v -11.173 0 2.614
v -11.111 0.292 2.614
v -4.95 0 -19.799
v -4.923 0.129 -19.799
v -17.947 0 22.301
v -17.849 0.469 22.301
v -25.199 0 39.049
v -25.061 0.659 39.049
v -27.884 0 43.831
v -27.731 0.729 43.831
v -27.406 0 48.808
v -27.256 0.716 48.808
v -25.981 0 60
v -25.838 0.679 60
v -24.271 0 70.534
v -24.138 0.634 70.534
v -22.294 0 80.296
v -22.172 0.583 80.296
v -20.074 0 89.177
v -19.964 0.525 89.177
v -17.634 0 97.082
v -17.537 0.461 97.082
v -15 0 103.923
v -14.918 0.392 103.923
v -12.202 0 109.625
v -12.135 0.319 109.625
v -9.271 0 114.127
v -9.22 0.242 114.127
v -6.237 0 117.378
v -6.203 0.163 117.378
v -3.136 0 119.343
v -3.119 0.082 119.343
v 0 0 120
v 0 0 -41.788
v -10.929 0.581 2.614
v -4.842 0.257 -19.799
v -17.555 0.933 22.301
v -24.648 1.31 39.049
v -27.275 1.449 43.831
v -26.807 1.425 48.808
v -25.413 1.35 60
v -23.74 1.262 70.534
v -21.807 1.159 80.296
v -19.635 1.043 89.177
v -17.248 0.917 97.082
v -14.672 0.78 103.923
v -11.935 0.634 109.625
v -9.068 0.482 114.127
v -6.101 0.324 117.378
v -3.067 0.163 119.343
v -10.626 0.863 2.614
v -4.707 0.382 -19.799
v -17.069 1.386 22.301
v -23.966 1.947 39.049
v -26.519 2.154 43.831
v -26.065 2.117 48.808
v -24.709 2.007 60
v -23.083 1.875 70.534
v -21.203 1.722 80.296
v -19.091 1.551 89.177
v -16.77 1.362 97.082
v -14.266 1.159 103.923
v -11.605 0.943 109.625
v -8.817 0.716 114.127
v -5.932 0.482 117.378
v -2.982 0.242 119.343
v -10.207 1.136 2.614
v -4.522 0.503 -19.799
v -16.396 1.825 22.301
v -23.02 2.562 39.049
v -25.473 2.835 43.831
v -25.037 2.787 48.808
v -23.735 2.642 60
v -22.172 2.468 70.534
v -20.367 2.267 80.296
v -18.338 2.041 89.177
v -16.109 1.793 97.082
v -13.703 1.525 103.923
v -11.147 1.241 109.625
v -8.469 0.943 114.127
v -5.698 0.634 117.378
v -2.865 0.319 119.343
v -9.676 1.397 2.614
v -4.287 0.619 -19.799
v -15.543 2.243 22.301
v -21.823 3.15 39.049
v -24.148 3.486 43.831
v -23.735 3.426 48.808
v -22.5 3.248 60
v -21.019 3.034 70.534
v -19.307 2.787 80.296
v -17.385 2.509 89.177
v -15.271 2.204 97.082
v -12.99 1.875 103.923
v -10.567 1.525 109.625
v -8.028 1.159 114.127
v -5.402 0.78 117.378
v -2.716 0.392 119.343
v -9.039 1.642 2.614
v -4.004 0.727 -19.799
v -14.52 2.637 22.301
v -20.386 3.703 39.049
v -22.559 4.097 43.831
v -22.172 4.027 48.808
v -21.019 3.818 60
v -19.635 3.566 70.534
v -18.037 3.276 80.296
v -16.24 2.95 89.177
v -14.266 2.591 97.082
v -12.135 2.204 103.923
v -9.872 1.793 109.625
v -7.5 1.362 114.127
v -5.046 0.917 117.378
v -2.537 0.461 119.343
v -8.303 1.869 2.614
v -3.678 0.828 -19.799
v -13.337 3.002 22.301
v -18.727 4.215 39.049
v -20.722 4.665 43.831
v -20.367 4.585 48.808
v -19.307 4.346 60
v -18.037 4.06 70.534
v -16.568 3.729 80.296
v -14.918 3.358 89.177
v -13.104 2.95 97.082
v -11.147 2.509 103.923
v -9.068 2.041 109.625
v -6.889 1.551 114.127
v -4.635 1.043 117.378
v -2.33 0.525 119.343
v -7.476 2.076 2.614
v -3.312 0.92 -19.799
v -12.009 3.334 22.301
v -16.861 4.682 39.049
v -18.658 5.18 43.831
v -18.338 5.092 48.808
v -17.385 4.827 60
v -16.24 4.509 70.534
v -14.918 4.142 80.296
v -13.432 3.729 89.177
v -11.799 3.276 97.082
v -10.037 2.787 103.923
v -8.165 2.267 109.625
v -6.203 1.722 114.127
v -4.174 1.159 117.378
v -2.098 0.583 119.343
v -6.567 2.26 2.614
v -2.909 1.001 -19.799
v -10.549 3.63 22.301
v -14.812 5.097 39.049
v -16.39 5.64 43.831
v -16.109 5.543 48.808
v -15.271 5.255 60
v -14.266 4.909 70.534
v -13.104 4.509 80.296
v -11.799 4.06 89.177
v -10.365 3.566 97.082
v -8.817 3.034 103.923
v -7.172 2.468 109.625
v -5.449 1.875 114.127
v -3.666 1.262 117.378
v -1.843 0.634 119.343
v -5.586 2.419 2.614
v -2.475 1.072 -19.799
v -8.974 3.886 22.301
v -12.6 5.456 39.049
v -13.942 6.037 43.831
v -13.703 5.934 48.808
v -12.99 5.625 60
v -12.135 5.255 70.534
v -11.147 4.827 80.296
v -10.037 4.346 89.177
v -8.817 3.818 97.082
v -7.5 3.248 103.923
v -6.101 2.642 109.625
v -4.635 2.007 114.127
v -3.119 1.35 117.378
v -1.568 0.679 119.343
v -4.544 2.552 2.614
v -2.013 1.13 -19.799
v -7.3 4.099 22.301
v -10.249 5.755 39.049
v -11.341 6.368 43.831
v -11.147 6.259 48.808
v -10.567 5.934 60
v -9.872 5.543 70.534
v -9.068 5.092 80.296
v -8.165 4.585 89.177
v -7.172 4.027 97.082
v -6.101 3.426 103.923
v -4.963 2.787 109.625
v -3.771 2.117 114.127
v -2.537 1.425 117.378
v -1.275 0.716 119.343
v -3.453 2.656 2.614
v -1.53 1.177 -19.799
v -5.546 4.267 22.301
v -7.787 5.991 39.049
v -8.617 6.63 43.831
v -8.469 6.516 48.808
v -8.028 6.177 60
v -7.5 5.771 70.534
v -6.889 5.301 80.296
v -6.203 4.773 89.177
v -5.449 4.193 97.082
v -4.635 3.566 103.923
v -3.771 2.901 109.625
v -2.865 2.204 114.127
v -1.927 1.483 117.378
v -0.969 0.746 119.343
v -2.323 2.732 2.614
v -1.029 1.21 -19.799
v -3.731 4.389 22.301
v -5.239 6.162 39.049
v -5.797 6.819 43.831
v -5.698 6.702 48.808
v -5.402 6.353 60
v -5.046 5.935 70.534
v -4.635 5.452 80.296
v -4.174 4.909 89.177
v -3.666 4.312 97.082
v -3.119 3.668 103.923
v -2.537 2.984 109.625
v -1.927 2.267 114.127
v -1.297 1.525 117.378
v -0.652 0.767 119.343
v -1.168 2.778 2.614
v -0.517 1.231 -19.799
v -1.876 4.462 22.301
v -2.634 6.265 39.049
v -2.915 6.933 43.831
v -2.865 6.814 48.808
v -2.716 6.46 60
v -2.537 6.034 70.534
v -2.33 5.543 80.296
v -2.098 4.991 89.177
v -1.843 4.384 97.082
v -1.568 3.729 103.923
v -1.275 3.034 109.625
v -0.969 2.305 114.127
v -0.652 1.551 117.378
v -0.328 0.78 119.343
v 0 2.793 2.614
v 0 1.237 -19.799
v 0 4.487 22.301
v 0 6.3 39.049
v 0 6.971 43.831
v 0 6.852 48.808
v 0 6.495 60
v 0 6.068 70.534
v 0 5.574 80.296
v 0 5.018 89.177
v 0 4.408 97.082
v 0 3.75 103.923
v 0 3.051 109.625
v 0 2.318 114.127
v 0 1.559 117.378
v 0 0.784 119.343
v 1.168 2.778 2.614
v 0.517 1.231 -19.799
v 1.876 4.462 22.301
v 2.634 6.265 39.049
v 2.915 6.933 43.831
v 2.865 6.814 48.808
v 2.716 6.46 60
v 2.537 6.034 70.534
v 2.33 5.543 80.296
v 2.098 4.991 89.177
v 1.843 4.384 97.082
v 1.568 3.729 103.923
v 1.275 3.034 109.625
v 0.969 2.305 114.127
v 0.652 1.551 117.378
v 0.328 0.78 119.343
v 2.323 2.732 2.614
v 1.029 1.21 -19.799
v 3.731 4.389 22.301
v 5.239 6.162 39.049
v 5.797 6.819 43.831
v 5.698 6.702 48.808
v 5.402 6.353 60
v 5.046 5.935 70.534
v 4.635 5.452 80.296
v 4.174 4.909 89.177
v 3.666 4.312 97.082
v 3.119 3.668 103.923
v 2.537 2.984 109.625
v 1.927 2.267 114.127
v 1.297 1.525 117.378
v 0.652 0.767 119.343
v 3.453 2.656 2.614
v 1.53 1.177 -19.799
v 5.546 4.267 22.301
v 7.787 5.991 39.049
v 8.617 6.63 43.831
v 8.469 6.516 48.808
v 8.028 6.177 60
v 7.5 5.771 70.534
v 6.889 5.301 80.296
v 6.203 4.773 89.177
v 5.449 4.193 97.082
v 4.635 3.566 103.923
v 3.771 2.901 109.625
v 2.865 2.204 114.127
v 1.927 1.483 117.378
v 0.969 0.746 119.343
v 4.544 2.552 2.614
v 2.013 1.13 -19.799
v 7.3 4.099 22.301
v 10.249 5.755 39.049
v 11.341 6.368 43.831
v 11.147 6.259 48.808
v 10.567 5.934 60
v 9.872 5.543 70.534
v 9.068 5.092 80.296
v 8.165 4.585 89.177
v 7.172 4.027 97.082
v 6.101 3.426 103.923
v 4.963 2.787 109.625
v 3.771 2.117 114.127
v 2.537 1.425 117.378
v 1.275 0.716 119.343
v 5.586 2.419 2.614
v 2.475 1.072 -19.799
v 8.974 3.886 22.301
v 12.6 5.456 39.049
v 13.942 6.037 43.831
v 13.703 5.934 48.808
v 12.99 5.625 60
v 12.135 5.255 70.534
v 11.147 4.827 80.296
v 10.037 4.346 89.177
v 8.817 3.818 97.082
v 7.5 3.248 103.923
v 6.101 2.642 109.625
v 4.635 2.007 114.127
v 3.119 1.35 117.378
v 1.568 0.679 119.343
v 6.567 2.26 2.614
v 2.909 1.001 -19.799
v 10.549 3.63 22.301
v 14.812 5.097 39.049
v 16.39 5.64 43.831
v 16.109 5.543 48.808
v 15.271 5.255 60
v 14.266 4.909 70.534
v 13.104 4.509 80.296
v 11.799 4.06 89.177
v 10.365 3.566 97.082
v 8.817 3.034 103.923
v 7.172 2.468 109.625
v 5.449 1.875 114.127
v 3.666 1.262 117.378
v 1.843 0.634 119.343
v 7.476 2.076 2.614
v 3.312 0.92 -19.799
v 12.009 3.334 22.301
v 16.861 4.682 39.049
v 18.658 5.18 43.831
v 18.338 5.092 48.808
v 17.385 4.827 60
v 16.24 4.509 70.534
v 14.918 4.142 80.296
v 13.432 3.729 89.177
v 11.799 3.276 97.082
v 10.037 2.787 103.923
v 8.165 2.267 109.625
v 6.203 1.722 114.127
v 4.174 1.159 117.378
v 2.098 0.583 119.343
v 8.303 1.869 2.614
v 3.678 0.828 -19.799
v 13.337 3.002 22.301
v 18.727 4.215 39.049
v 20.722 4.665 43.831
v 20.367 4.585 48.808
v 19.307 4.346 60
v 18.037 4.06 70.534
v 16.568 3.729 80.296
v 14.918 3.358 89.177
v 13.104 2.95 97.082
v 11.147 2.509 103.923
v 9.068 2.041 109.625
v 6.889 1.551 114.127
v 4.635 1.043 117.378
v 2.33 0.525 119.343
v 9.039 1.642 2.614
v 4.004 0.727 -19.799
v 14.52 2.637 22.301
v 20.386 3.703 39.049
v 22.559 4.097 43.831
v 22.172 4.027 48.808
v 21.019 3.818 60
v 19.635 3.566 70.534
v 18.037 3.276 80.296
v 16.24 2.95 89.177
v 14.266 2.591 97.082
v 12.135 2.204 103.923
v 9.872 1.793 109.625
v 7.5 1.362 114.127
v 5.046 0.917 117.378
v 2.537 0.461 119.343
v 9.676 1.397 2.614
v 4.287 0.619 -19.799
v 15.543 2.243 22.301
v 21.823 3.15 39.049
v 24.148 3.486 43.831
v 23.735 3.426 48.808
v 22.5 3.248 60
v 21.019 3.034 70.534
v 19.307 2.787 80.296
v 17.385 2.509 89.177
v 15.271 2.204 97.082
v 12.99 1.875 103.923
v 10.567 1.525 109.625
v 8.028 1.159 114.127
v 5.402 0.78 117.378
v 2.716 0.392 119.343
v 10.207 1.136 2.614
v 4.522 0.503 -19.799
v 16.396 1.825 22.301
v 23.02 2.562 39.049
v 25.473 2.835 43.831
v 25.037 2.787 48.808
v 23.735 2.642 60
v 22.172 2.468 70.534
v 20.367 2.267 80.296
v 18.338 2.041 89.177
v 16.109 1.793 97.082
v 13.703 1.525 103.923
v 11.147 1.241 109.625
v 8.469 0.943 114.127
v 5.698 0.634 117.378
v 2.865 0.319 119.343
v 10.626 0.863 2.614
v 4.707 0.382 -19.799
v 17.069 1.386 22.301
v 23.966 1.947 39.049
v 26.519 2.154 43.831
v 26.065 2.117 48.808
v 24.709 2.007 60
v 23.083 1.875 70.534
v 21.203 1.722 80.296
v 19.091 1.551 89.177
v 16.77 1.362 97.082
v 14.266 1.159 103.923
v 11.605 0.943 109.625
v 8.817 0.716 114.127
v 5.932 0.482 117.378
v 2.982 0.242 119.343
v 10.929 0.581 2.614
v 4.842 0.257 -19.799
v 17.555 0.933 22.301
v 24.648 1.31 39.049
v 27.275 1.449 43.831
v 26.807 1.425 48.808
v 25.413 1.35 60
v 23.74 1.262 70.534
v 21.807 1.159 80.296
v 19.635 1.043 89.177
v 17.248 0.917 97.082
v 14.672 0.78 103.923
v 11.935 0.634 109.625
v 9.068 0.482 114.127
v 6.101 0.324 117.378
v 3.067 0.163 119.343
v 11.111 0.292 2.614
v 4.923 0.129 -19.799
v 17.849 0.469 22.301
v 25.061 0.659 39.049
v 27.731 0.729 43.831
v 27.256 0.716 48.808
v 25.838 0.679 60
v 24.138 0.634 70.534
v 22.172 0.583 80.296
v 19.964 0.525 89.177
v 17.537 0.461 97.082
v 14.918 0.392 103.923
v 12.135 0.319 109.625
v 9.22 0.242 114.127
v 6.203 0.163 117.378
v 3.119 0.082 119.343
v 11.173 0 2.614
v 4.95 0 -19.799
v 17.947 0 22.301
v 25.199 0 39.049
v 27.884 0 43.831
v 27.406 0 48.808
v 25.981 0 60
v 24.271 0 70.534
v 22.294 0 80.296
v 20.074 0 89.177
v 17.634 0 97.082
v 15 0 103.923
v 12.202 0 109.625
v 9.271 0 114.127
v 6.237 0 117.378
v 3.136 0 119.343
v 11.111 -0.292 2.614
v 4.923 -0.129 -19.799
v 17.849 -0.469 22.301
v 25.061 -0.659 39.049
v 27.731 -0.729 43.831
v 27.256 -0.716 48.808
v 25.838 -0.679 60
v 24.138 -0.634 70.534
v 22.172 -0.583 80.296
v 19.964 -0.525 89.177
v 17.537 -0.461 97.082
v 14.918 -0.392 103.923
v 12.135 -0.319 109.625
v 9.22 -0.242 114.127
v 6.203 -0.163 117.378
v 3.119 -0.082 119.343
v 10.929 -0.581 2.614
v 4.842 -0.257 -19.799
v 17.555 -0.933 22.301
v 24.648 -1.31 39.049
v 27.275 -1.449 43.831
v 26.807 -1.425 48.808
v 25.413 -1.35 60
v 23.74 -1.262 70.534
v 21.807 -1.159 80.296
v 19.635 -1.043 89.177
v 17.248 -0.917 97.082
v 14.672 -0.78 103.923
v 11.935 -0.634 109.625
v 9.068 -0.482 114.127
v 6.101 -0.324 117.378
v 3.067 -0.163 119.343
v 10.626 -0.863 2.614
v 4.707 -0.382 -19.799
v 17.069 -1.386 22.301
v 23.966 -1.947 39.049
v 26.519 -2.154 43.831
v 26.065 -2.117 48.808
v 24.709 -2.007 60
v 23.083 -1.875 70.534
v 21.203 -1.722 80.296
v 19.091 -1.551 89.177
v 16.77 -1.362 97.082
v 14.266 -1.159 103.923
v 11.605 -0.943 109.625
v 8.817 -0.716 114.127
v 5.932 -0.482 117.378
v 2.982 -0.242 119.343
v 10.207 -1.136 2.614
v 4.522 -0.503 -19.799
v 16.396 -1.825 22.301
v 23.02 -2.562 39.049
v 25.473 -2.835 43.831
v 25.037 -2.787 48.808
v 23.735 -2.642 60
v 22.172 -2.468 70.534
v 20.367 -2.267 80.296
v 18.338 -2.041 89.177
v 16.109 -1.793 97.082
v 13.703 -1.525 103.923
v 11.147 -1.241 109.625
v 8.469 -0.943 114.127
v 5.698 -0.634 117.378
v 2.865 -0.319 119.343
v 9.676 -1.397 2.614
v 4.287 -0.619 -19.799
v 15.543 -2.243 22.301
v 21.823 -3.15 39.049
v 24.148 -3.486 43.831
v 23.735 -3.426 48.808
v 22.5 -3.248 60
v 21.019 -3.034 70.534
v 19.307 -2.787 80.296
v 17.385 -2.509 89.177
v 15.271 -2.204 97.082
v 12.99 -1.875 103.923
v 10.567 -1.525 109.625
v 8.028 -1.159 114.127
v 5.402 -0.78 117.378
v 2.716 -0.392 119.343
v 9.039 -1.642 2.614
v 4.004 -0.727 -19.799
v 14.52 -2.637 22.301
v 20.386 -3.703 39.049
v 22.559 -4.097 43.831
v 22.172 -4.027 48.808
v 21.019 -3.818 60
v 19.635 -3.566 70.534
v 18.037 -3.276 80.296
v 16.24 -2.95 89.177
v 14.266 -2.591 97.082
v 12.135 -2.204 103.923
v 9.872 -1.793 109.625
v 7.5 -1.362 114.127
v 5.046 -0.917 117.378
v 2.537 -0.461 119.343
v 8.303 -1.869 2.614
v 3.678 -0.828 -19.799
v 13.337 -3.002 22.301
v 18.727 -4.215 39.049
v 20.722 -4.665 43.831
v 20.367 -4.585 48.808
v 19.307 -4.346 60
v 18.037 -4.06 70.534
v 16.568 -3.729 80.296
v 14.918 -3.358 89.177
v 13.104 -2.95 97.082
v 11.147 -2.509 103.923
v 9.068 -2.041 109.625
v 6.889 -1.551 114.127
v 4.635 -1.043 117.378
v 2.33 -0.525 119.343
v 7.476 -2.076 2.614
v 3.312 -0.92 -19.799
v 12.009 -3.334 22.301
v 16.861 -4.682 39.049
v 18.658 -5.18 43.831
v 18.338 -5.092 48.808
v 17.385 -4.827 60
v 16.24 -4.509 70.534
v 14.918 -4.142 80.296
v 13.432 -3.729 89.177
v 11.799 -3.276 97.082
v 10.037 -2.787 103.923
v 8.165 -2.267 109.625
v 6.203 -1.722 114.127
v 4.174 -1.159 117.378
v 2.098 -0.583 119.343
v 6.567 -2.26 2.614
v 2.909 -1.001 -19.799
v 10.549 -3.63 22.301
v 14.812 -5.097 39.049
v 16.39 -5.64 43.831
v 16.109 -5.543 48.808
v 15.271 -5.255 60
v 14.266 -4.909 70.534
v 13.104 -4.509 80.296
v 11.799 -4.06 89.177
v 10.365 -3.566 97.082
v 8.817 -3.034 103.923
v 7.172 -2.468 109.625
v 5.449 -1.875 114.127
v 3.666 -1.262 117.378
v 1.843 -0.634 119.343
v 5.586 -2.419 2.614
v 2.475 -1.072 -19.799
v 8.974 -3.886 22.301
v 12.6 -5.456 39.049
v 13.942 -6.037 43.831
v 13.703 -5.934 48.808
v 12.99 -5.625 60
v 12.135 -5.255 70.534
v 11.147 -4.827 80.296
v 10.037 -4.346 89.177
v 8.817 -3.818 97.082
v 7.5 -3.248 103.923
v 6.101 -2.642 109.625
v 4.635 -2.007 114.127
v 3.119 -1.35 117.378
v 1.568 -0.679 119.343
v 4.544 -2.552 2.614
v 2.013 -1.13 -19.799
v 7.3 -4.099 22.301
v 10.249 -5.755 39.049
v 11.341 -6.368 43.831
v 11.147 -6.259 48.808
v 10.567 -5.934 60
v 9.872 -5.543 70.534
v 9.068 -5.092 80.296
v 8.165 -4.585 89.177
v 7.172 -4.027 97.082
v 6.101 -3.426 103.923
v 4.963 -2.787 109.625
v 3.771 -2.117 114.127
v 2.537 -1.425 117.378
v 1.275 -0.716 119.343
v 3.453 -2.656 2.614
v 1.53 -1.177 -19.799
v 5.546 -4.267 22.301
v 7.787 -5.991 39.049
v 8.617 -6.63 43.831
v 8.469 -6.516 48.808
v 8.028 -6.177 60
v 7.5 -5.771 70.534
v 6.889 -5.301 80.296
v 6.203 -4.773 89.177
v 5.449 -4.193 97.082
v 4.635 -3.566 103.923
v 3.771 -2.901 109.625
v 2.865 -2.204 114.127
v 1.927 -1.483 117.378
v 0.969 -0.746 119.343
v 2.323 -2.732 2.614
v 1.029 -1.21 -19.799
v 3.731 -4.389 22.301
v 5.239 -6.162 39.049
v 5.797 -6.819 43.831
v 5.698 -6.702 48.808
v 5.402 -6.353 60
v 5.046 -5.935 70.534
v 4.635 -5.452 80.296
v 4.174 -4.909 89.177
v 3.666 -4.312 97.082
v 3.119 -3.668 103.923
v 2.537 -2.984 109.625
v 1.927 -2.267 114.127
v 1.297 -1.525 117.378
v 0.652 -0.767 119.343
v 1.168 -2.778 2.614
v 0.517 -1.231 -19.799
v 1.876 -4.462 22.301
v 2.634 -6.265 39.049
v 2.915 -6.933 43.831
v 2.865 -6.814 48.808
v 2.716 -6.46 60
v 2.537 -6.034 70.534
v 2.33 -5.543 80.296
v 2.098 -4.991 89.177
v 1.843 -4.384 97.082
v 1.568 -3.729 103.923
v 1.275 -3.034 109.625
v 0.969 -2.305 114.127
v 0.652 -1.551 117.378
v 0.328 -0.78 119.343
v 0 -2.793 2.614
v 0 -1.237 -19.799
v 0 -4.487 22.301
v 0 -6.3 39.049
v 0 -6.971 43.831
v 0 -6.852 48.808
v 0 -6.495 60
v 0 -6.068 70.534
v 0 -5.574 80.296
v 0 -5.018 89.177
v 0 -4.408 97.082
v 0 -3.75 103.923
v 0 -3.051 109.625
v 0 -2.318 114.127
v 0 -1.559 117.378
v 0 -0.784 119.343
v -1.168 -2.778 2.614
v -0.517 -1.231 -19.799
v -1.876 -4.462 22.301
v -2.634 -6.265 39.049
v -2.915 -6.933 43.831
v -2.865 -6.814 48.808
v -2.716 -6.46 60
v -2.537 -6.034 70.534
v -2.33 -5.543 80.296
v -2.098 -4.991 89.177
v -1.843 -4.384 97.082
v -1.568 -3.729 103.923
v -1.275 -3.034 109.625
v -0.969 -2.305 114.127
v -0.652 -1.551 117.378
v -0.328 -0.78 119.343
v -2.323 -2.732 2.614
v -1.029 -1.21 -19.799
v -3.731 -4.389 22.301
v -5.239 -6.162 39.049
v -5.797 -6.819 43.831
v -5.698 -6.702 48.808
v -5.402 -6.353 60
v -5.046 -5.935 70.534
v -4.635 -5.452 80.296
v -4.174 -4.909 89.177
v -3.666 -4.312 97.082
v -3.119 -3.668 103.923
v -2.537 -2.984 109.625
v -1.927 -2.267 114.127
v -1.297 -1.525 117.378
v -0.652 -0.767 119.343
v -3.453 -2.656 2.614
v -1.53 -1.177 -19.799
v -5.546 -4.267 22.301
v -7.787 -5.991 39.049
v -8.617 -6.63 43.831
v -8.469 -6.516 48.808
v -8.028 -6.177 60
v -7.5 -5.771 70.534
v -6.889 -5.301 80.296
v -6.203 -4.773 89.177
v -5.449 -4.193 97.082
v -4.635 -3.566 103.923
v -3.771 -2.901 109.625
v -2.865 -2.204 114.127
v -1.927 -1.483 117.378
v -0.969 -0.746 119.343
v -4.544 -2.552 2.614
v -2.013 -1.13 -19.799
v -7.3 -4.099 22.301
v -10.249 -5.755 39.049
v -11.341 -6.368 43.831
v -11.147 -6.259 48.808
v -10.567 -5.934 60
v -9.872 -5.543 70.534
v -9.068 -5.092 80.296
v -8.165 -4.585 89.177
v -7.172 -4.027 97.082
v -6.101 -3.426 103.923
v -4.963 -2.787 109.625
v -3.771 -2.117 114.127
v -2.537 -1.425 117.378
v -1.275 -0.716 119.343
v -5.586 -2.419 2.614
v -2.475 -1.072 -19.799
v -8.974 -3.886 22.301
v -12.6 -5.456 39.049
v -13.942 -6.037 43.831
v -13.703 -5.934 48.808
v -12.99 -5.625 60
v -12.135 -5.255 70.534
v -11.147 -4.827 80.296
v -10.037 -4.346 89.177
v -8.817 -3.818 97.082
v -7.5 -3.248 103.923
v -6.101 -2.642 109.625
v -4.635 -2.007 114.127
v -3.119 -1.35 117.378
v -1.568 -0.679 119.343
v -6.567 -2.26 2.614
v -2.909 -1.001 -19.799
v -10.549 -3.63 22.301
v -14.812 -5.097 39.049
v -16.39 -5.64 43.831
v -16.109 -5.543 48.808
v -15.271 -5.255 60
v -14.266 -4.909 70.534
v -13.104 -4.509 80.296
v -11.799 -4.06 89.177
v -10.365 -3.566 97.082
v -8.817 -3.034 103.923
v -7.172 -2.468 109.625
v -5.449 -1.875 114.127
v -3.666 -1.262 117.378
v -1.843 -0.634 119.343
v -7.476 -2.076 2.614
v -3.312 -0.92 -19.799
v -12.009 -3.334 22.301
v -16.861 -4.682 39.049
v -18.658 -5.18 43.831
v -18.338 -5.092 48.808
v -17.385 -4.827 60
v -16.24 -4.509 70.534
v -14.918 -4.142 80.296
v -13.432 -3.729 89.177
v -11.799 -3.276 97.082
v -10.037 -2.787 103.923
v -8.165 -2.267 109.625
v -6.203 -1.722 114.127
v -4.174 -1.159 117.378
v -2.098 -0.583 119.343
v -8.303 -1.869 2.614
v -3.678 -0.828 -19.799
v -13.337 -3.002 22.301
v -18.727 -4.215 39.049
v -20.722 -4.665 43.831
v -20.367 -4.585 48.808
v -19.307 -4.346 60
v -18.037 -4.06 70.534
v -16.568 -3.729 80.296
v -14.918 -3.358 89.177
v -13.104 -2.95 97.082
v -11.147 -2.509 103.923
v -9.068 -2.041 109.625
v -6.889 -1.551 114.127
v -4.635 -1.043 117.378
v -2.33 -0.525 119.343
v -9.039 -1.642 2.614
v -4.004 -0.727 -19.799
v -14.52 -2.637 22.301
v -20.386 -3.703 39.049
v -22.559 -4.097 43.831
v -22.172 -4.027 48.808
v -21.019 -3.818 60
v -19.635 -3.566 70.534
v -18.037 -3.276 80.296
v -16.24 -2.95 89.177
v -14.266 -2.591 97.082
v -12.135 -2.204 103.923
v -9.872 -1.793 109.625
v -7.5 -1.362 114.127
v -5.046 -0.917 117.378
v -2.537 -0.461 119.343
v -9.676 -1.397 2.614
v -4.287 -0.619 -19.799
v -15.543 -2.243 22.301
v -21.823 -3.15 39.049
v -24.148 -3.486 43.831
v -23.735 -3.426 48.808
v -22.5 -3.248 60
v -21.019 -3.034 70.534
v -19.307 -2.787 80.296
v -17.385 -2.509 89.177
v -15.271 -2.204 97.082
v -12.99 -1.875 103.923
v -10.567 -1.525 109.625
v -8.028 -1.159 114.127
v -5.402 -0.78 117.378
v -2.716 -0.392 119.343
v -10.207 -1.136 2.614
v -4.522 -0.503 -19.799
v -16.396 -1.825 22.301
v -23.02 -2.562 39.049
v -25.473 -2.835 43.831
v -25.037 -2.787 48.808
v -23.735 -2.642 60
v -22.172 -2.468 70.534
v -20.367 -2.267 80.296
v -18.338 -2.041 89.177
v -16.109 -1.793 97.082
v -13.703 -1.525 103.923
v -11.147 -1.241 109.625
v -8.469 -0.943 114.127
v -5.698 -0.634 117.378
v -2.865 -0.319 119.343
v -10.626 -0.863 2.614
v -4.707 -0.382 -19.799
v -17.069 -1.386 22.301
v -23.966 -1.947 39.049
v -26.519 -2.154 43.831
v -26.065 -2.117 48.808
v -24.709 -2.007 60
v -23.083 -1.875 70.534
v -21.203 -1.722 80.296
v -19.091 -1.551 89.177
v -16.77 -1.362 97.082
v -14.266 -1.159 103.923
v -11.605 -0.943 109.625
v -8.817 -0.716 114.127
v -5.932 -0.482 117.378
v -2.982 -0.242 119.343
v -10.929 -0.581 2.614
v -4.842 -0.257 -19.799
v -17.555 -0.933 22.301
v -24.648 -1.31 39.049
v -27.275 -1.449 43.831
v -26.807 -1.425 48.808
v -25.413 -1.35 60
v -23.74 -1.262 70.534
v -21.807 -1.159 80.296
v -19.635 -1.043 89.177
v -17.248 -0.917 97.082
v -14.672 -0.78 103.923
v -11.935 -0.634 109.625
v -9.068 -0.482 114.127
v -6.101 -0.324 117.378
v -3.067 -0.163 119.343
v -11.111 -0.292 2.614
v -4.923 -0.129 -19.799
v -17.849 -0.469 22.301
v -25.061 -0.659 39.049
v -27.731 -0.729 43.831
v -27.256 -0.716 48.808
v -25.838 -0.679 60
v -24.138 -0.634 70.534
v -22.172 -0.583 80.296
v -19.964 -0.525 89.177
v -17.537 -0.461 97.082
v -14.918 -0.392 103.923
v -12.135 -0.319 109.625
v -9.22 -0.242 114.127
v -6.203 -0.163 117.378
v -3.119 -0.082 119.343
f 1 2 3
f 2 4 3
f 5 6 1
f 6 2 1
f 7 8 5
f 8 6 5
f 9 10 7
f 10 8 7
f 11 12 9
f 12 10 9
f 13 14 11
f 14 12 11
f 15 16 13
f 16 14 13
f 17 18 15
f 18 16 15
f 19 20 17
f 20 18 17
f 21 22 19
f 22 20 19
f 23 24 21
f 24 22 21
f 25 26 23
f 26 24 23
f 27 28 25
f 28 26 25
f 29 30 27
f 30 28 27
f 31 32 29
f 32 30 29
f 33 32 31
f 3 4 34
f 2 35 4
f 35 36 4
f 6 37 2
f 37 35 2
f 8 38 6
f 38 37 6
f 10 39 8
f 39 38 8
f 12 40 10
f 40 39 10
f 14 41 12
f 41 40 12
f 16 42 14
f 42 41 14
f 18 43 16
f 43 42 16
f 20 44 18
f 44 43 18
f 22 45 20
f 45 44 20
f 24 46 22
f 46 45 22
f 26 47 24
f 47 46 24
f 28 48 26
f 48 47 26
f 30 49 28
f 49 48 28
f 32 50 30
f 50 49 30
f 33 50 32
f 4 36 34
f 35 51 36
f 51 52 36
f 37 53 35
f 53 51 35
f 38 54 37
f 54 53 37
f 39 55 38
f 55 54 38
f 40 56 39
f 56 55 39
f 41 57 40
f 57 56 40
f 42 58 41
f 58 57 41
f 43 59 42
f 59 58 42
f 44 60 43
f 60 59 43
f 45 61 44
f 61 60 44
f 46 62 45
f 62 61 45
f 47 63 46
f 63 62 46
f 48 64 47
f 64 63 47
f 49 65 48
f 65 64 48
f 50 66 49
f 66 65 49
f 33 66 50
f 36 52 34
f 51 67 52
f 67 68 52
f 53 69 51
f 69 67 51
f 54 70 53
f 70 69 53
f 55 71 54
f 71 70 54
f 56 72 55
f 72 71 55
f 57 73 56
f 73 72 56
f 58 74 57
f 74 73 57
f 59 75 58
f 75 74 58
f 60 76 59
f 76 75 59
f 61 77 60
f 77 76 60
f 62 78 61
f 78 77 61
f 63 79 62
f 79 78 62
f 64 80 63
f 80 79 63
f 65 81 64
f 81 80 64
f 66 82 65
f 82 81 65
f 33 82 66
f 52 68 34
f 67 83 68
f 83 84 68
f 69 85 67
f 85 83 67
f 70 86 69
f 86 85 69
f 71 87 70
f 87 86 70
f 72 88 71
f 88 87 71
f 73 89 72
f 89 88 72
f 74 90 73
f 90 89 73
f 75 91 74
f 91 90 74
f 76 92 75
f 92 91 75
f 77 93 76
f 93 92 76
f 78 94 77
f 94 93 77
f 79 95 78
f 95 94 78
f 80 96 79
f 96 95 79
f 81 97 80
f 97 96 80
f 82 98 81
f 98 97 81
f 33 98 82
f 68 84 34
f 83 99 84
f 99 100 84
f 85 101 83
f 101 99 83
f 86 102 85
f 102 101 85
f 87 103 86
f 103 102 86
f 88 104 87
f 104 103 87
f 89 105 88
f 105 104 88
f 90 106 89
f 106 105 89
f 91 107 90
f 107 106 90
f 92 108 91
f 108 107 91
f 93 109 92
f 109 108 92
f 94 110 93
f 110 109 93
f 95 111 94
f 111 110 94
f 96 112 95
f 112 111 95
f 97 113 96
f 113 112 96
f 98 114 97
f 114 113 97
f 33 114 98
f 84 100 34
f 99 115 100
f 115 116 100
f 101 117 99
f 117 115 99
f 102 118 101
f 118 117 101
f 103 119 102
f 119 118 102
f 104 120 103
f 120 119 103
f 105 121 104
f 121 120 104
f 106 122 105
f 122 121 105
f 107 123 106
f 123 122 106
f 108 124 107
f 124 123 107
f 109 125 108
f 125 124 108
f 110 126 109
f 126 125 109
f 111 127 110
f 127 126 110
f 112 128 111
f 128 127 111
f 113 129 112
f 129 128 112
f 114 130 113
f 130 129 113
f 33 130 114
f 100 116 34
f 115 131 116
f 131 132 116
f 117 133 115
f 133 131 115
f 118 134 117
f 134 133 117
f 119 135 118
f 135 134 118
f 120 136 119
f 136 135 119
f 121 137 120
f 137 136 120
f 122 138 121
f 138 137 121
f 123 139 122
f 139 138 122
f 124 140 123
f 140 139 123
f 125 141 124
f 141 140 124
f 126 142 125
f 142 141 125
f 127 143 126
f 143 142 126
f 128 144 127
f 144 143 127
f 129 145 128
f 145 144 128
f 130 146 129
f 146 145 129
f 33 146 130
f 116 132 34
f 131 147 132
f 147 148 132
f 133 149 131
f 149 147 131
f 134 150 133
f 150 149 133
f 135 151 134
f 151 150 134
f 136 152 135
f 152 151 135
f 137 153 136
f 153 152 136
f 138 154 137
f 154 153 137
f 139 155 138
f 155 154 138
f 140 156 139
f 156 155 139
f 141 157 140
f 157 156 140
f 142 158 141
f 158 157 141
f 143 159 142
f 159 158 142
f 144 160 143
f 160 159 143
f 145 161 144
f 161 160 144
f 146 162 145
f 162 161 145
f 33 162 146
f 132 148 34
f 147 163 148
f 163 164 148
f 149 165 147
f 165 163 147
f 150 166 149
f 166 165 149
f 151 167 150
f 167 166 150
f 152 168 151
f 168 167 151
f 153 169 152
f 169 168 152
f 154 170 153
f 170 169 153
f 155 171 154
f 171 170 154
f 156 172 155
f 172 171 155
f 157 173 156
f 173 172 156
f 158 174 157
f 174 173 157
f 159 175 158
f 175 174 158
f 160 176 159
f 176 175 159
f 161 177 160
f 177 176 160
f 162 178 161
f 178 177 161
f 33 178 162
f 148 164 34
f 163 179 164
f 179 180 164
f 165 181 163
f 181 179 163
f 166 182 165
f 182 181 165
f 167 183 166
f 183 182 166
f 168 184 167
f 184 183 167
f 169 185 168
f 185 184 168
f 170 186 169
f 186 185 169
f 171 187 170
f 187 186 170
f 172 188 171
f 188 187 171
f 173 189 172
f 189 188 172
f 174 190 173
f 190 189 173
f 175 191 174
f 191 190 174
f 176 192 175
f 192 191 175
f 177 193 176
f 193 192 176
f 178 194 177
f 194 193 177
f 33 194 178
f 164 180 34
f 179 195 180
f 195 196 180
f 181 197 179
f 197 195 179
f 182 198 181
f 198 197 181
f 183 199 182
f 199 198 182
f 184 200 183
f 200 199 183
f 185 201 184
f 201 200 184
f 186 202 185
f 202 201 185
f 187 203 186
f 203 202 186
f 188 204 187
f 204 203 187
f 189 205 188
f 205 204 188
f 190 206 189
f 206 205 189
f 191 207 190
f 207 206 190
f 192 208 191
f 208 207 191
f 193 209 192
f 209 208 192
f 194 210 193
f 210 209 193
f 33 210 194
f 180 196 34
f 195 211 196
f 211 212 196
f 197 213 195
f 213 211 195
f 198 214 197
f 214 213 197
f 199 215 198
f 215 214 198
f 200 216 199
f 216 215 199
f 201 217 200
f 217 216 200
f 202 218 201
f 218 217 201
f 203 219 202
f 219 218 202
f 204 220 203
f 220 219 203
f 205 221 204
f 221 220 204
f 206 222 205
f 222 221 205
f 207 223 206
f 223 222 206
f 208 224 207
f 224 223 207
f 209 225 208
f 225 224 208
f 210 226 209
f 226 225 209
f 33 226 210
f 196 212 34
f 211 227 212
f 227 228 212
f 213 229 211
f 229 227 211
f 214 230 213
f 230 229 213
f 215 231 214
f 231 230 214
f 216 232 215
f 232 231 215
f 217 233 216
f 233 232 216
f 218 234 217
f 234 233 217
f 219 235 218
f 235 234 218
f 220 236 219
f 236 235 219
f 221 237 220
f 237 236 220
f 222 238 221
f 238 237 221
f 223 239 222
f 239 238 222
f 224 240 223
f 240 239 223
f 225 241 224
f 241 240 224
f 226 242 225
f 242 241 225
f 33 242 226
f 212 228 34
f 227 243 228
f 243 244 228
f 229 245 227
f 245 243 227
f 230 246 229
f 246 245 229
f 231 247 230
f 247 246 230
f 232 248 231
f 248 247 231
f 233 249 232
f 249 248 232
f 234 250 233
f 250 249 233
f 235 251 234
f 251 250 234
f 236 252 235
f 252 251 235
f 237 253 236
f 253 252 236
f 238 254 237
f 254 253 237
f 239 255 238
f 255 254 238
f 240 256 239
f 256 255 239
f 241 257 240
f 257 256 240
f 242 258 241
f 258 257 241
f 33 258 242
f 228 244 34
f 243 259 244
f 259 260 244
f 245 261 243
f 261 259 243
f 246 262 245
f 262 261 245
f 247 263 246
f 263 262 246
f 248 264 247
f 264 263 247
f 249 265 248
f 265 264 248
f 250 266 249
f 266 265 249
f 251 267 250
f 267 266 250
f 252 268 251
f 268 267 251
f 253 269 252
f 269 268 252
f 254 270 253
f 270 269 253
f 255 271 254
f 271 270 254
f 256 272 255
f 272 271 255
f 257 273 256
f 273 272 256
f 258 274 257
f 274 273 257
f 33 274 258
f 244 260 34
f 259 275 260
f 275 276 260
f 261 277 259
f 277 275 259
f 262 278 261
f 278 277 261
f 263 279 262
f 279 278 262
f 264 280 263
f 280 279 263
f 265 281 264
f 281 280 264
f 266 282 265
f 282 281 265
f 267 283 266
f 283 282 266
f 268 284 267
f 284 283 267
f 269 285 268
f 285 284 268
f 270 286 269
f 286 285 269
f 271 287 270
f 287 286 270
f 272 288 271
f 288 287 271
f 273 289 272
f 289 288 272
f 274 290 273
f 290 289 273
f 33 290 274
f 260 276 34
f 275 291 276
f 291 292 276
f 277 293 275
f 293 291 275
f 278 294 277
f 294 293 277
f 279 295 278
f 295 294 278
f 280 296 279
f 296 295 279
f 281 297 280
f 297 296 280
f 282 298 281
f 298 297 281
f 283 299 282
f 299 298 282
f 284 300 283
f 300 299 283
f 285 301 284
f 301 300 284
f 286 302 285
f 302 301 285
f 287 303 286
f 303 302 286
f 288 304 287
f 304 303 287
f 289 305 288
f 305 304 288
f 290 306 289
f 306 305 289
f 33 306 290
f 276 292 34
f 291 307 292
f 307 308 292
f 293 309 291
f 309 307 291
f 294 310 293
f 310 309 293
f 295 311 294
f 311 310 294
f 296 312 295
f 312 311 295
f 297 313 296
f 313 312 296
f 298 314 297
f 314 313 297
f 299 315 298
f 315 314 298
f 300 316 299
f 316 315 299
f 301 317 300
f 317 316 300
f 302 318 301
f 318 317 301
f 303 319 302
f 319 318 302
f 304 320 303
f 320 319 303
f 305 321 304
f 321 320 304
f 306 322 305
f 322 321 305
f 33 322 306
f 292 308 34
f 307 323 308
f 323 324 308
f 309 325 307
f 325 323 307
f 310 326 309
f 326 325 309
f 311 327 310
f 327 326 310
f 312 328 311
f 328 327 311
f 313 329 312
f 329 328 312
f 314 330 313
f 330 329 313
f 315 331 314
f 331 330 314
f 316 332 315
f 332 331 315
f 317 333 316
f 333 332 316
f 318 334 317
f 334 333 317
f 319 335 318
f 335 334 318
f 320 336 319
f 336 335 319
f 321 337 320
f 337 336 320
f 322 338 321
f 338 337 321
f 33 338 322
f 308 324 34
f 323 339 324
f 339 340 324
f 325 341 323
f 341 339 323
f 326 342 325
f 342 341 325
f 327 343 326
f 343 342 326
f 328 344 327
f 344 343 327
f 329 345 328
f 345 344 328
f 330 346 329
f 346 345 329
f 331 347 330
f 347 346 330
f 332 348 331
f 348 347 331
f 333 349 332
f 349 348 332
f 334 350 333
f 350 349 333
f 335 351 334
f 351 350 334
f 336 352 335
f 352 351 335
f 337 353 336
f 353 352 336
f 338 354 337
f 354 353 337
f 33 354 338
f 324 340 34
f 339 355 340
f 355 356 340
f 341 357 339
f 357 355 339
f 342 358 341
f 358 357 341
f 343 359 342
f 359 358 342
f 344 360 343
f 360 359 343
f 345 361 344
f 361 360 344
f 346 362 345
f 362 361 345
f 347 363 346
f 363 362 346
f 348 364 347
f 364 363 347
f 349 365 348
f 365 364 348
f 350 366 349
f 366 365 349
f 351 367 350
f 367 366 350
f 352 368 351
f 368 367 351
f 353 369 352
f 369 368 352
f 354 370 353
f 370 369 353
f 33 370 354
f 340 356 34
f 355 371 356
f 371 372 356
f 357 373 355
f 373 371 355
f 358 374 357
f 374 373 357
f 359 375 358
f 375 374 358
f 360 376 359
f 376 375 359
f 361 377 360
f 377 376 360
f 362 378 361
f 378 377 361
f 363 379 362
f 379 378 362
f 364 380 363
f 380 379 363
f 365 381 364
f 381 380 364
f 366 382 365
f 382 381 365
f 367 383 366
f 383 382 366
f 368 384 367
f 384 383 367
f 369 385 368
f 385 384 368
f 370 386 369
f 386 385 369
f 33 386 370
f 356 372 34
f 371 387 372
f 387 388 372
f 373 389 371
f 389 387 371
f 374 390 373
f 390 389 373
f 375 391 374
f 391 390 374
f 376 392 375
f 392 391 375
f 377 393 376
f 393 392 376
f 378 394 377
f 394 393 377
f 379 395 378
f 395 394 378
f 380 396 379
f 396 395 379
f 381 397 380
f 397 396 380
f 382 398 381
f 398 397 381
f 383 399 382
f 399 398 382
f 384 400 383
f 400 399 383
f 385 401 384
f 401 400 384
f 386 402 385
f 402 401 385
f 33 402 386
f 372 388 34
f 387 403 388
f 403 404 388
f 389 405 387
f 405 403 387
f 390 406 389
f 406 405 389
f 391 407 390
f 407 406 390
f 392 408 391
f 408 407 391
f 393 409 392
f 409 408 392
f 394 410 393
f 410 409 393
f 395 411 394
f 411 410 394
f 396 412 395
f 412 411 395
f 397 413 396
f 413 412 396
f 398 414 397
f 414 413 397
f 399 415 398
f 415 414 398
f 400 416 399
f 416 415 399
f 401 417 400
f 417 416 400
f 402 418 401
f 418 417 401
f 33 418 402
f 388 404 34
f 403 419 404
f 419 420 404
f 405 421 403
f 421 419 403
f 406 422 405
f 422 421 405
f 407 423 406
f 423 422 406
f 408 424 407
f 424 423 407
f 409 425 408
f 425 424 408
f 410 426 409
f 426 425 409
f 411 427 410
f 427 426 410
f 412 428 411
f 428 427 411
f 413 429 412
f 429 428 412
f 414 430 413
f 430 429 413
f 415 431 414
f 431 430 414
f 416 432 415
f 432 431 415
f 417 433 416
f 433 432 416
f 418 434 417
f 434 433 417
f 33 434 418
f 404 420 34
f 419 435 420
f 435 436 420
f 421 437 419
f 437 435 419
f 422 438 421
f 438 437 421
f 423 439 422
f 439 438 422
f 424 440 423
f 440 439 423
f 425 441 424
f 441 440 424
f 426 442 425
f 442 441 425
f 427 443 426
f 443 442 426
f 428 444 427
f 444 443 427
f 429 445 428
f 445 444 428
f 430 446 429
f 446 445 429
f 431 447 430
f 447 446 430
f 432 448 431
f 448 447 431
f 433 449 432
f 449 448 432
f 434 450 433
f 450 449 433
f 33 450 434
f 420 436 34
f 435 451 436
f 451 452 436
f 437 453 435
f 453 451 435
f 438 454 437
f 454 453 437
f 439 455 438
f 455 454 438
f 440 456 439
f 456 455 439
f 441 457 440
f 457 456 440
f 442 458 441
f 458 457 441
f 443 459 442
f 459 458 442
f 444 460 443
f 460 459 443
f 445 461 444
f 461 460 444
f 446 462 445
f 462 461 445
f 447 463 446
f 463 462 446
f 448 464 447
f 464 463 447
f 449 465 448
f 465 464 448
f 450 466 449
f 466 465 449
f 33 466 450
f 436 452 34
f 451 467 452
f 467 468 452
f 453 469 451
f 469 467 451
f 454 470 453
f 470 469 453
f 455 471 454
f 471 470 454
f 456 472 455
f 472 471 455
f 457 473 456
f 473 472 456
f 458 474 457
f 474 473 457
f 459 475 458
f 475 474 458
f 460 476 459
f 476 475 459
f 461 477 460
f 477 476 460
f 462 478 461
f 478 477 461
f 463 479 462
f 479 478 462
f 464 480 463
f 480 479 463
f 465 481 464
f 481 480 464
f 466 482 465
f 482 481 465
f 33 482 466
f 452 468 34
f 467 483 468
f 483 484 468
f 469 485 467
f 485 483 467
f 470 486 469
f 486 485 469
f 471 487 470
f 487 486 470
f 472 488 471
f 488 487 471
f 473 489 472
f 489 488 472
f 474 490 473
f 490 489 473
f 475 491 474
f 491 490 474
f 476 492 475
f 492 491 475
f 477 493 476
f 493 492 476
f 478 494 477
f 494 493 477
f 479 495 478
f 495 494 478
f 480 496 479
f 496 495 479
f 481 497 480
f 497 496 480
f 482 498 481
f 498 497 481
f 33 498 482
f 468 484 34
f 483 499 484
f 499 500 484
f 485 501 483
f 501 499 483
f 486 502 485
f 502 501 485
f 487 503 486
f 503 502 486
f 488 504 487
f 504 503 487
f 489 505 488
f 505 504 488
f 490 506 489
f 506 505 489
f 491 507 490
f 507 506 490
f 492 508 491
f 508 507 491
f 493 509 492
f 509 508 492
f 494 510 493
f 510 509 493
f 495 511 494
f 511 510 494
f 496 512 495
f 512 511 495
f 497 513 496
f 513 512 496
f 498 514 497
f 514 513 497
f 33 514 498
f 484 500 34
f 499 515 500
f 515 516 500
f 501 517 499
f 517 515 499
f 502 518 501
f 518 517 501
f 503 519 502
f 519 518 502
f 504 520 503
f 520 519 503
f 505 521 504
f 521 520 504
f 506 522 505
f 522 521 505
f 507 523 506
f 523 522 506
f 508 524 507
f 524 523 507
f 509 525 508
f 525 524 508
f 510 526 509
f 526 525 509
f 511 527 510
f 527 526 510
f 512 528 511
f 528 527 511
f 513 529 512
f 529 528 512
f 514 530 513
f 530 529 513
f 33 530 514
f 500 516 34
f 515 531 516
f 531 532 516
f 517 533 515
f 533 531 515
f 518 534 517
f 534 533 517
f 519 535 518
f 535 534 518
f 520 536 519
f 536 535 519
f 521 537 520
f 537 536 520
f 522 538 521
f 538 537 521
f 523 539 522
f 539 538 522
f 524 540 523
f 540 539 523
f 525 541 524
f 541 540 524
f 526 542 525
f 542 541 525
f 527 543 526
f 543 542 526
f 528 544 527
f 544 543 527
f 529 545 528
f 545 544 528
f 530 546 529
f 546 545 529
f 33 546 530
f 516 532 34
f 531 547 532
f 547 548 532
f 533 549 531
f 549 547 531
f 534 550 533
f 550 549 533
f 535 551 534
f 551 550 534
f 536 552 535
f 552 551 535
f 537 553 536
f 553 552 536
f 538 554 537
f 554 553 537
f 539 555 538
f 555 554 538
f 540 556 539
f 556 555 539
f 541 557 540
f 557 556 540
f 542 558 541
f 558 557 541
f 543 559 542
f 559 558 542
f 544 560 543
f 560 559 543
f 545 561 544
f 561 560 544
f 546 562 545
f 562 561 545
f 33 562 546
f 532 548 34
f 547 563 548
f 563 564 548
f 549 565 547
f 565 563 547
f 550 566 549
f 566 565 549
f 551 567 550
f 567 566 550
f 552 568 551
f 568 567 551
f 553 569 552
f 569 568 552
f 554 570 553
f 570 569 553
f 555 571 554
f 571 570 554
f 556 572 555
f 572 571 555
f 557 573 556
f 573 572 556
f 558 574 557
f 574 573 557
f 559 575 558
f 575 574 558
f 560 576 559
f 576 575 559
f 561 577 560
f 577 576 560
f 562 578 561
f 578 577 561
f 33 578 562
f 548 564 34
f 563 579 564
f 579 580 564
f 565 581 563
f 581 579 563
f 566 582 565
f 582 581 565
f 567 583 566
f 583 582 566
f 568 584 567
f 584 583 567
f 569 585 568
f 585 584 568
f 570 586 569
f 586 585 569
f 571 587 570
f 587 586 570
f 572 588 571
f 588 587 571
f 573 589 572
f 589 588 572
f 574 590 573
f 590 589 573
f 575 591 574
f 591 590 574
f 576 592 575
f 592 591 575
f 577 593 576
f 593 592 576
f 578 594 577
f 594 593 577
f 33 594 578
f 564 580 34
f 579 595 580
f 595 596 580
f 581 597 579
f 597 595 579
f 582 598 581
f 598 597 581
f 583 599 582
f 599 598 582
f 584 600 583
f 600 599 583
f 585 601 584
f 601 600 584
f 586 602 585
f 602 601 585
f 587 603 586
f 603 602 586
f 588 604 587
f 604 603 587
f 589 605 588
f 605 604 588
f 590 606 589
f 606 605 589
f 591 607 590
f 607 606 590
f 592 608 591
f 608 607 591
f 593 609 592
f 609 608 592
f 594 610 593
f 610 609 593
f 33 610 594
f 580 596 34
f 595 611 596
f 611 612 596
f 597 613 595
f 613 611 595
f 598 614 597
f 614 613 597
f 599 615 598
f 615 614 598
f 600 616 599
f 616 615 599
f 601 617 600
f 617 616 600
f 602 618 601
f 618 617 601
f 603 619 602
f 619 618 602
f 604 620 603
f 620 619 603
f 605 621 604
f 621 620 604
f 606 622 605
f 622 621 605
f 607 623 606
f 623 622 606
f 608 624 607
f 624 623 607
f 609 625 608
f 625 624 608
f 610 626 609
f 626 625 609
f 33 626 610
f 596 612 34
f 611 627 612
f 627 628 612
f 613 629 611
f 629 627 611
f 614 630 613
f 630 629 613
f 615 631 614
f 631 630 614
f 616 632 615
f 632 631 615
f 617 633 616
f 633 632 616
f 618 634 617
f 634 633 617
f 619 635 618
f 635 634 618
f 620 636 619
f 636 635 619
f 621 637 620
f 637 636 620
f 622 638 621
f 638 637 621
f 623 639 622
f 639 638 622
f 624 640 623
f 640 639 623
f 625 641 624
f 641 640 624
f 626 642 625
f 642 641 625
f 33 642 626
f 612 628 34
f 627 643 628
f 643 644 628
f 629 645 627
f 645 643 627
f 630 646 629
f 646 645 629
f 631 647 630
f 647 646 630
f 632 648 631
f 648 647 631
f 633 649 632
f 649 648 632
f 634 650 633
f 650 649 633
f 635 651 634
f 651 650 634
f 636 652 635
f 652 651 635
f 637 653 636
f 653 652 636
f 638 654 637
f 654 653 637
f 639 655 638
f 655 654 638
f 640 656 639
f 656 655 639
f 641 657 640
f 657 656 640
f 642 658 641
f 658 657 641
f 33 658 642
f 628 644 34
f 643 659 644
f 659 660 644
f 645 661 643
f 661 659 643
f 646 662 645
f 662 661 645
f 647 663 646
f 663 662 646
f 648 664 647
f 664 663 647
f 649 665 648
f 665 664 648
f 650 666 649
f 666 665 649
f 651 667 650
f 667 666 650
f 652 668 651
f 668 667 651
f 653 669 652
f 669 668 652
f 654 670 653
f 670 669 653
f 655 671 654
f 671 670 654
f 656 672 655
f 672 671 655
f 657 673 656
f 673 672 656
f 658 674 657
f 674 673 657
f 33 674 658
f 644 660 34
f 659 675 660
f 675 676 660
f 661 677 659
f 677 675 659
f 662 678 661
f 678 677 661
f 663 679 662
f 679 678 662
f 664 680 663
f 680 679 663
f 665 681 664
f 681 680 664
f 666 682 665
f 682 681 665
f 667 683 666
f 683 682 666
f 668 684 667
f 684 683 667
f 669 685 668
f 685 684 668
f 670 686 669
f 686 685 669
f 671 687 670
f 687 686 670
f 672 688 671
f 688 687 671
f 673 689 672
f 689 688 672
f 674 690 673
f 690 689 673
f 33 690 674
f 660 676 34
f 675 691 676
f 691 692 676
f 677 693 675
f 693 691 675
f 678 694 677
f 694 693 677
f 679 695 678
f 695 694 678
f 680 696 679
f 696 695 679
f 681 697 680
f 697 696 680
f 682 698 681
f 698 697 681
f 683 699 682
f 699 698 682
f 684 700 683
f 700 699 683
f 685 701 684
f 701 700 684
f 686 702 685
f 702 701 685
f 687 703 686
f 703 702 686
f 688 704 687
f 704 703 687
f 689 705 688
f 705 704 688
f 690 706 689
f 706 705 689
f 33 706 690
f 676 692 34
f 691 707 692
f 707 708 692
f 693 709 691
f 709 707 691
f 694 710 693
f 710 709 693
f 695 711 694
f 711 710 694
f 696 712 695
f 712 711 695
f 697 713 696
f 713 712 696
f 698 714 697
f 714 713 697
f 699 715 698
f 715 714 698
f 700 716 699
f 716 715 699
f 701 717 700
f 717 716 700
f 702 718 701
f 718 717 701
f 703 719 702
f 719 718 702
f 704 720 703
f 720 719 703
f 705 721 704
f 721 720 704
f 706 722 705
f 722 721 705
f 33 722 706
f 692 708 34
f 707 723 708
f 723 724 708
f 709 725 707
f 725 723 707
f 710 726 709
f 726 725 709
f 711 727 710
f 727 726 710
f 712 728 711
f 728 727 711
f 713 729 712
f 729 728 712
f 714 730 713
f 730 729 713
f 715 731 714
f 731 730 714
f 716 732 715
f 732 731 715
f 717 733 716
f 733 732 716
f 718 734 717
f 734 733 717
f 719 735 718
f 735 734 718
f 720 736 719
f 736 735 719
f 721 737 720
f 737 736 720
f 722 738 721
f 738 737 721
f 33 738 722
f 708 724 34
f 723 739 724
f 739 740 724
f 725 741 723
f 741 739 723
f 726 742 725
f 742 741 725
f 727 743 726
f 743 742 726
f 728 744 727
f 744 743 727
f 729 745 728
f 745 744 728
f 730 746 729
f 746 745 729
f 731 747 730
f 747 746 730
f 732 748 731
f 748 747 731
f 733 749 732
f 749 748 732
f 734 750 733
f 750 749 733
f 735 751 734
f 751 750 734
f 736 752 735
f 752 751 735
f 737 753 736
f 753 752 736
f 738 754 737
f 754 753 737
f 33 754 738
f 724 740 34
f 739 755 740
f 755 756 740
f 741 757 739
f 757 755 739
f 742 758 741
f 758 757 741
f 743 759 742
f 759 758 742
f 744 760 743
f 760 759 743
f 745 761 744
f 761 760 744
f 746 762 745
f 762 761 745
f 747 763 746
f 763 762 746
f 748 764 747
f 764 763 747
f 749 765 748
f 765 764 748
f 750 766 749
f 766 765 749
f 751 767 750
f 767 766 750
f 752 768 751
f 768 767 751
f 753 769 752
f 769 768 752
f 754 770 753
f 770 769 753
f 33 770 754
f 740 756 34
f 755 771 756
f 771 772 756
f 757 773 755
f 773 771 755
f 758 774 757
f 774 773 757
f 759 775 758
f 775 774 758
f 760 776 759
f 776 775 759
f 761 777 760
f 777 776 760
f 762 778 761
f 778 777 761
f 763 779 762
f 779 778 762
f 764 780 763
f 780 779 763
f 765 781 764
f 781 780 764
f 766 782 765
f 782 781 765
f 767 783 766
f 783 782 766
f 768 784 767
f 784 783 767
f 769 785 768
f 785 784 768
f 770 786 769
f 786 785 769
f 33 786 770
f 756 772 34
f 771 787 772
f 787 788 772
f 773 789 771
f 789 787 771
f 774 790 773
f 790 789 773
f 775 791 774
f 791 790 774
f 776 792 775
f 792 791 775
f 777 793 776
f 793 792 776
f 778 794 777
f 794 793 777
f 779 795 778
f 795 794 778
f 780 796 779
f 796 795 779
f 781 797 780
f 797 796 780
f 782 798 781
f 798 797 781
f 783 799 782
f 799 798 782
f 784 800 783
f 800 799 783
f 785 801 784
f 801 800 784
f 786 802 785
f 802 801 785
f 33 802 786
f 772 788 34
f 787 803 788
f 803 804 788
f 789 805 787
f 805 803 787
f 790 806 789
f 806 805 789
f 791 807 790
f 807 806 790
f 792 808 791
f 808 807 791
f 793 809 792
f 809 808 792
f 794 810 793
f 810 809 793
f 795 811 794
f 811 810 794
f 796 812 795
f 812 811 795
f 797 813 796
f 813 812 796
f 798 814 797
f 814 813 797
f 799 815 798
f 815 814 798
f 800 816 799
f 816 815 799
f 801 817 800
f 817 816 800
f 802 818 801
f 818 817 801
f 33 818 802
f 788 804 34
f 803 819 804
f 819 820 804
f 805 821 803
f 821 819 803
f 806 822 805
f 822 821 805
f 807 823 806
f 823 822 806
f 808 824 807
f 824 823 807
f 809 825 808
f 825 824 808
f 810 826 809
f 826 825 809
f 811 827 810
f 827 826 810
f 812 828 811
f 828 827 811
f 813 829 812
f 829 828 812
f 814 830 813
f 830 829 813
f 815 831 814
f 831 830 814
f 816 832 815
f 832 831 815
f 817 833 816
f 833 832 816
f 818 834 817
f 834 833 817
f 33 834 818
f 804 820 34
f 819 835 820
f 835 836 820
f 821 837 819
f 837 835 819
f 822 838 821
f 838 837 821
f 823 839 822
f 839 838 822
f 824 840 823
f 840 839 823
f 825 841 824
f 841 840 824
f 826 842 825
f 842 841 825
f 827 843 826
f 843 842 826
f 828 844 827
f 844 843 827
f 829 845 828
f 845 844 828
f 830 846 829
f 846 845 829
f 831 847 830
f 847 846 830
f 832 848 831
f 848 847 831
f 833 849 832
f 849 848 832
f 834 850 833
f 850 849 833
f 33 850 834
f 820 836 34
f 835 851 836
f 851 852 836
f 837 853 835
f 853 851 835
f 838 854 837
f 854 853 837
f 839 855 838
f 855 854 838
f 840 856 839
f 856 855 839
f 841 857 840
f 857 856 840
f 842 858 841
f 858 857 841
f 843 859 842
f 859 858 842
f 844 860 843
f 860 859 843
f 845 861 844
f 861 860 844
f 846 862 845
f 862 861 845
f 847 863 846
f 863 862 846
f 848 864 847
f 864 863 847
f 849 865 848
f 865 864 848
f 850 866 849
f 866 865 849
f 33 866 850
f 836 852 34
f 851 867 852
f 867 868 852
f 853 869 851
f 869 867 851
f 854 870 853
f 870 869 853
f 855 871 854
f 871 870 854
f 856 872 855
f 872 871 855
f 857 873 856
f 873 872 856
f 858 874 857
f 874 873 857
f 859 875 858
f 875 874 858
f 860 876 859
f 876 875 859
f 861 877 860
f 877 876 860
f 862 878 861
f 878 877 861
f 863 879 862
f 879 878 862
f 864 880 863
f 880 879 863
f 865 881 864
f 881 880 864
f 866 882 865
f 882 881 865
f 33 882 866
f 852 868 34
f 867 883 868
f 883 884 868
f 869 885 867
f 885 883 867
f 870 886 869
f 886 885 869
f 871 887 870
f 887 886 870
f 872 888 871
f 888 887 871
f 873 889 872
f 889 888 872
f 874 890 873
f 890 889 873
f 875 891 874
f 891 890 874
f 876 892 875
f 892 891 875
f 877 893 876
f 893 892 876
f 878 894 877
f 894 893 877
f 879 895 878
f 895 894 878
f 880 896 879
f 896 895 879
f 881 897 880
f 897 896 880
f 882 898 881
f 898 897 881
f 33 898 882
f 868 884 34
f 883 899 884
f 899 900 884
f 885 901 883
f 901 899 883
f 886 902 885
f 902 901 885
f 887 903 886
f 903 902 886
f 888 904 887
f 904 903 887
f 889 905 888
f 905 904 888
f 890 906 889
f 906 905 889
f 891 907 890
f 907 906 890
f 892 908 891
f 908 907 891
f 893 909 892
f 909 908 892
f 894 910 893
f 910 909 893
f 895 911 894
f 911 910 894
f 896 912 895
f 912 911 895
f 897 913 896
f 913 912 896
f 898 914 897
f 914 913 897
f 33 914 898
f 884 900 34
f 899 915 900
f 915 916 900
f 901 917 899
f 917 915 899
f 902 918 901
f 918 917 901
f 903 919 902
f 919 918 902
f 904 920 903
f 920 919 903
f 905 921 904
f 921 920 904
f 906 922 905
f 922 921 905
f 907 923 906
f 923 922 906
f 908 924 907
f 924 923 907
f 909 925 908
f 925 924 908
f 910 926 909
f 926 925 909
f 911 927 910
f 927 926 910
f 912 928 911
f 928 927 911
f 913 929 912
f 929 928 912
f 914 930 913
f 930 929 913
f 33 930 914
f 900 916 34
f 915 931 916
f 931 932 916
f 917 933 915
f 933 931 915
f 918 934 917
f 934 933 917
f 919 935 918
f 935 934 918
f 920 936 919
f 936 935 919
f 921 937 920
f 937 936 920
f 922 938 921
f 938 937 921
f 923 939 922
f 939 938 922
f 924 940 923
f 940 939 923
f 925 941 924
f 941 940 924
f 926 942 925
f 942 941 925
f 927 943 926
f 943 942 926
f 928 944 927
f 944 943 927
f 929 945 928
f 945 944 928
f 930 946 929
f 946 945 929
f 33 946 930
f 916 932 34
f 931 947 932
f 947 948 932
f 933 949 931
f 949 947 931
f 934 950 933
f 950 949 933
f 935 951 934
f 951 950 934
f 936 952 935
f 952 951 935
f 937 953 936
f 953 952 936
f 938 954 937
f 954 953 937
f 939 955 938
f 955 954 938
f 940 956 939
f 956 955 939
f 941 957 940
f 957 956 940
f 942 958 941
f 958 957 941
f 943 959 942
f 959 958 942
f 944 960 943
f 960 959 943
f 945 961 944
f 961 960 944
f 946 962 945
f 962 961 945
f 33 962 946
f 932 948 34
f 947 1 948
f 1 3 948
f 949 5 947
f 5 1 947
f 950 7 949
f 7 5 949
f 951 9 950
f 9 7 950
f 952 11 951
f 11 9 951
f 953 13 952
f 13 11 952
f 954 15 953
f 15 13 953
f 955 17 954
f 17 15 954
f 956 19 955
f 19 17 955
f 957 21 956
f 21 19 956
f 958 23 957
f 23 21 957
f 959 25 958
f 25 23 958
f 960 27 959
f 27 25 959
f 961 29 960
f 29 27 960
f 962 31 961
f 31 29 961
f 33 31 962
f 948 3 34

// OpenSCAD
$fn=60;
r=80;
scale([1,.25,4])

rotate_extrude()intersection(){
    translate([0,-r])square([r,r*2]);
difference(){
    circle(30);
    
   rotate(-45) translate([r+7,0,0])circle(r);
}}
